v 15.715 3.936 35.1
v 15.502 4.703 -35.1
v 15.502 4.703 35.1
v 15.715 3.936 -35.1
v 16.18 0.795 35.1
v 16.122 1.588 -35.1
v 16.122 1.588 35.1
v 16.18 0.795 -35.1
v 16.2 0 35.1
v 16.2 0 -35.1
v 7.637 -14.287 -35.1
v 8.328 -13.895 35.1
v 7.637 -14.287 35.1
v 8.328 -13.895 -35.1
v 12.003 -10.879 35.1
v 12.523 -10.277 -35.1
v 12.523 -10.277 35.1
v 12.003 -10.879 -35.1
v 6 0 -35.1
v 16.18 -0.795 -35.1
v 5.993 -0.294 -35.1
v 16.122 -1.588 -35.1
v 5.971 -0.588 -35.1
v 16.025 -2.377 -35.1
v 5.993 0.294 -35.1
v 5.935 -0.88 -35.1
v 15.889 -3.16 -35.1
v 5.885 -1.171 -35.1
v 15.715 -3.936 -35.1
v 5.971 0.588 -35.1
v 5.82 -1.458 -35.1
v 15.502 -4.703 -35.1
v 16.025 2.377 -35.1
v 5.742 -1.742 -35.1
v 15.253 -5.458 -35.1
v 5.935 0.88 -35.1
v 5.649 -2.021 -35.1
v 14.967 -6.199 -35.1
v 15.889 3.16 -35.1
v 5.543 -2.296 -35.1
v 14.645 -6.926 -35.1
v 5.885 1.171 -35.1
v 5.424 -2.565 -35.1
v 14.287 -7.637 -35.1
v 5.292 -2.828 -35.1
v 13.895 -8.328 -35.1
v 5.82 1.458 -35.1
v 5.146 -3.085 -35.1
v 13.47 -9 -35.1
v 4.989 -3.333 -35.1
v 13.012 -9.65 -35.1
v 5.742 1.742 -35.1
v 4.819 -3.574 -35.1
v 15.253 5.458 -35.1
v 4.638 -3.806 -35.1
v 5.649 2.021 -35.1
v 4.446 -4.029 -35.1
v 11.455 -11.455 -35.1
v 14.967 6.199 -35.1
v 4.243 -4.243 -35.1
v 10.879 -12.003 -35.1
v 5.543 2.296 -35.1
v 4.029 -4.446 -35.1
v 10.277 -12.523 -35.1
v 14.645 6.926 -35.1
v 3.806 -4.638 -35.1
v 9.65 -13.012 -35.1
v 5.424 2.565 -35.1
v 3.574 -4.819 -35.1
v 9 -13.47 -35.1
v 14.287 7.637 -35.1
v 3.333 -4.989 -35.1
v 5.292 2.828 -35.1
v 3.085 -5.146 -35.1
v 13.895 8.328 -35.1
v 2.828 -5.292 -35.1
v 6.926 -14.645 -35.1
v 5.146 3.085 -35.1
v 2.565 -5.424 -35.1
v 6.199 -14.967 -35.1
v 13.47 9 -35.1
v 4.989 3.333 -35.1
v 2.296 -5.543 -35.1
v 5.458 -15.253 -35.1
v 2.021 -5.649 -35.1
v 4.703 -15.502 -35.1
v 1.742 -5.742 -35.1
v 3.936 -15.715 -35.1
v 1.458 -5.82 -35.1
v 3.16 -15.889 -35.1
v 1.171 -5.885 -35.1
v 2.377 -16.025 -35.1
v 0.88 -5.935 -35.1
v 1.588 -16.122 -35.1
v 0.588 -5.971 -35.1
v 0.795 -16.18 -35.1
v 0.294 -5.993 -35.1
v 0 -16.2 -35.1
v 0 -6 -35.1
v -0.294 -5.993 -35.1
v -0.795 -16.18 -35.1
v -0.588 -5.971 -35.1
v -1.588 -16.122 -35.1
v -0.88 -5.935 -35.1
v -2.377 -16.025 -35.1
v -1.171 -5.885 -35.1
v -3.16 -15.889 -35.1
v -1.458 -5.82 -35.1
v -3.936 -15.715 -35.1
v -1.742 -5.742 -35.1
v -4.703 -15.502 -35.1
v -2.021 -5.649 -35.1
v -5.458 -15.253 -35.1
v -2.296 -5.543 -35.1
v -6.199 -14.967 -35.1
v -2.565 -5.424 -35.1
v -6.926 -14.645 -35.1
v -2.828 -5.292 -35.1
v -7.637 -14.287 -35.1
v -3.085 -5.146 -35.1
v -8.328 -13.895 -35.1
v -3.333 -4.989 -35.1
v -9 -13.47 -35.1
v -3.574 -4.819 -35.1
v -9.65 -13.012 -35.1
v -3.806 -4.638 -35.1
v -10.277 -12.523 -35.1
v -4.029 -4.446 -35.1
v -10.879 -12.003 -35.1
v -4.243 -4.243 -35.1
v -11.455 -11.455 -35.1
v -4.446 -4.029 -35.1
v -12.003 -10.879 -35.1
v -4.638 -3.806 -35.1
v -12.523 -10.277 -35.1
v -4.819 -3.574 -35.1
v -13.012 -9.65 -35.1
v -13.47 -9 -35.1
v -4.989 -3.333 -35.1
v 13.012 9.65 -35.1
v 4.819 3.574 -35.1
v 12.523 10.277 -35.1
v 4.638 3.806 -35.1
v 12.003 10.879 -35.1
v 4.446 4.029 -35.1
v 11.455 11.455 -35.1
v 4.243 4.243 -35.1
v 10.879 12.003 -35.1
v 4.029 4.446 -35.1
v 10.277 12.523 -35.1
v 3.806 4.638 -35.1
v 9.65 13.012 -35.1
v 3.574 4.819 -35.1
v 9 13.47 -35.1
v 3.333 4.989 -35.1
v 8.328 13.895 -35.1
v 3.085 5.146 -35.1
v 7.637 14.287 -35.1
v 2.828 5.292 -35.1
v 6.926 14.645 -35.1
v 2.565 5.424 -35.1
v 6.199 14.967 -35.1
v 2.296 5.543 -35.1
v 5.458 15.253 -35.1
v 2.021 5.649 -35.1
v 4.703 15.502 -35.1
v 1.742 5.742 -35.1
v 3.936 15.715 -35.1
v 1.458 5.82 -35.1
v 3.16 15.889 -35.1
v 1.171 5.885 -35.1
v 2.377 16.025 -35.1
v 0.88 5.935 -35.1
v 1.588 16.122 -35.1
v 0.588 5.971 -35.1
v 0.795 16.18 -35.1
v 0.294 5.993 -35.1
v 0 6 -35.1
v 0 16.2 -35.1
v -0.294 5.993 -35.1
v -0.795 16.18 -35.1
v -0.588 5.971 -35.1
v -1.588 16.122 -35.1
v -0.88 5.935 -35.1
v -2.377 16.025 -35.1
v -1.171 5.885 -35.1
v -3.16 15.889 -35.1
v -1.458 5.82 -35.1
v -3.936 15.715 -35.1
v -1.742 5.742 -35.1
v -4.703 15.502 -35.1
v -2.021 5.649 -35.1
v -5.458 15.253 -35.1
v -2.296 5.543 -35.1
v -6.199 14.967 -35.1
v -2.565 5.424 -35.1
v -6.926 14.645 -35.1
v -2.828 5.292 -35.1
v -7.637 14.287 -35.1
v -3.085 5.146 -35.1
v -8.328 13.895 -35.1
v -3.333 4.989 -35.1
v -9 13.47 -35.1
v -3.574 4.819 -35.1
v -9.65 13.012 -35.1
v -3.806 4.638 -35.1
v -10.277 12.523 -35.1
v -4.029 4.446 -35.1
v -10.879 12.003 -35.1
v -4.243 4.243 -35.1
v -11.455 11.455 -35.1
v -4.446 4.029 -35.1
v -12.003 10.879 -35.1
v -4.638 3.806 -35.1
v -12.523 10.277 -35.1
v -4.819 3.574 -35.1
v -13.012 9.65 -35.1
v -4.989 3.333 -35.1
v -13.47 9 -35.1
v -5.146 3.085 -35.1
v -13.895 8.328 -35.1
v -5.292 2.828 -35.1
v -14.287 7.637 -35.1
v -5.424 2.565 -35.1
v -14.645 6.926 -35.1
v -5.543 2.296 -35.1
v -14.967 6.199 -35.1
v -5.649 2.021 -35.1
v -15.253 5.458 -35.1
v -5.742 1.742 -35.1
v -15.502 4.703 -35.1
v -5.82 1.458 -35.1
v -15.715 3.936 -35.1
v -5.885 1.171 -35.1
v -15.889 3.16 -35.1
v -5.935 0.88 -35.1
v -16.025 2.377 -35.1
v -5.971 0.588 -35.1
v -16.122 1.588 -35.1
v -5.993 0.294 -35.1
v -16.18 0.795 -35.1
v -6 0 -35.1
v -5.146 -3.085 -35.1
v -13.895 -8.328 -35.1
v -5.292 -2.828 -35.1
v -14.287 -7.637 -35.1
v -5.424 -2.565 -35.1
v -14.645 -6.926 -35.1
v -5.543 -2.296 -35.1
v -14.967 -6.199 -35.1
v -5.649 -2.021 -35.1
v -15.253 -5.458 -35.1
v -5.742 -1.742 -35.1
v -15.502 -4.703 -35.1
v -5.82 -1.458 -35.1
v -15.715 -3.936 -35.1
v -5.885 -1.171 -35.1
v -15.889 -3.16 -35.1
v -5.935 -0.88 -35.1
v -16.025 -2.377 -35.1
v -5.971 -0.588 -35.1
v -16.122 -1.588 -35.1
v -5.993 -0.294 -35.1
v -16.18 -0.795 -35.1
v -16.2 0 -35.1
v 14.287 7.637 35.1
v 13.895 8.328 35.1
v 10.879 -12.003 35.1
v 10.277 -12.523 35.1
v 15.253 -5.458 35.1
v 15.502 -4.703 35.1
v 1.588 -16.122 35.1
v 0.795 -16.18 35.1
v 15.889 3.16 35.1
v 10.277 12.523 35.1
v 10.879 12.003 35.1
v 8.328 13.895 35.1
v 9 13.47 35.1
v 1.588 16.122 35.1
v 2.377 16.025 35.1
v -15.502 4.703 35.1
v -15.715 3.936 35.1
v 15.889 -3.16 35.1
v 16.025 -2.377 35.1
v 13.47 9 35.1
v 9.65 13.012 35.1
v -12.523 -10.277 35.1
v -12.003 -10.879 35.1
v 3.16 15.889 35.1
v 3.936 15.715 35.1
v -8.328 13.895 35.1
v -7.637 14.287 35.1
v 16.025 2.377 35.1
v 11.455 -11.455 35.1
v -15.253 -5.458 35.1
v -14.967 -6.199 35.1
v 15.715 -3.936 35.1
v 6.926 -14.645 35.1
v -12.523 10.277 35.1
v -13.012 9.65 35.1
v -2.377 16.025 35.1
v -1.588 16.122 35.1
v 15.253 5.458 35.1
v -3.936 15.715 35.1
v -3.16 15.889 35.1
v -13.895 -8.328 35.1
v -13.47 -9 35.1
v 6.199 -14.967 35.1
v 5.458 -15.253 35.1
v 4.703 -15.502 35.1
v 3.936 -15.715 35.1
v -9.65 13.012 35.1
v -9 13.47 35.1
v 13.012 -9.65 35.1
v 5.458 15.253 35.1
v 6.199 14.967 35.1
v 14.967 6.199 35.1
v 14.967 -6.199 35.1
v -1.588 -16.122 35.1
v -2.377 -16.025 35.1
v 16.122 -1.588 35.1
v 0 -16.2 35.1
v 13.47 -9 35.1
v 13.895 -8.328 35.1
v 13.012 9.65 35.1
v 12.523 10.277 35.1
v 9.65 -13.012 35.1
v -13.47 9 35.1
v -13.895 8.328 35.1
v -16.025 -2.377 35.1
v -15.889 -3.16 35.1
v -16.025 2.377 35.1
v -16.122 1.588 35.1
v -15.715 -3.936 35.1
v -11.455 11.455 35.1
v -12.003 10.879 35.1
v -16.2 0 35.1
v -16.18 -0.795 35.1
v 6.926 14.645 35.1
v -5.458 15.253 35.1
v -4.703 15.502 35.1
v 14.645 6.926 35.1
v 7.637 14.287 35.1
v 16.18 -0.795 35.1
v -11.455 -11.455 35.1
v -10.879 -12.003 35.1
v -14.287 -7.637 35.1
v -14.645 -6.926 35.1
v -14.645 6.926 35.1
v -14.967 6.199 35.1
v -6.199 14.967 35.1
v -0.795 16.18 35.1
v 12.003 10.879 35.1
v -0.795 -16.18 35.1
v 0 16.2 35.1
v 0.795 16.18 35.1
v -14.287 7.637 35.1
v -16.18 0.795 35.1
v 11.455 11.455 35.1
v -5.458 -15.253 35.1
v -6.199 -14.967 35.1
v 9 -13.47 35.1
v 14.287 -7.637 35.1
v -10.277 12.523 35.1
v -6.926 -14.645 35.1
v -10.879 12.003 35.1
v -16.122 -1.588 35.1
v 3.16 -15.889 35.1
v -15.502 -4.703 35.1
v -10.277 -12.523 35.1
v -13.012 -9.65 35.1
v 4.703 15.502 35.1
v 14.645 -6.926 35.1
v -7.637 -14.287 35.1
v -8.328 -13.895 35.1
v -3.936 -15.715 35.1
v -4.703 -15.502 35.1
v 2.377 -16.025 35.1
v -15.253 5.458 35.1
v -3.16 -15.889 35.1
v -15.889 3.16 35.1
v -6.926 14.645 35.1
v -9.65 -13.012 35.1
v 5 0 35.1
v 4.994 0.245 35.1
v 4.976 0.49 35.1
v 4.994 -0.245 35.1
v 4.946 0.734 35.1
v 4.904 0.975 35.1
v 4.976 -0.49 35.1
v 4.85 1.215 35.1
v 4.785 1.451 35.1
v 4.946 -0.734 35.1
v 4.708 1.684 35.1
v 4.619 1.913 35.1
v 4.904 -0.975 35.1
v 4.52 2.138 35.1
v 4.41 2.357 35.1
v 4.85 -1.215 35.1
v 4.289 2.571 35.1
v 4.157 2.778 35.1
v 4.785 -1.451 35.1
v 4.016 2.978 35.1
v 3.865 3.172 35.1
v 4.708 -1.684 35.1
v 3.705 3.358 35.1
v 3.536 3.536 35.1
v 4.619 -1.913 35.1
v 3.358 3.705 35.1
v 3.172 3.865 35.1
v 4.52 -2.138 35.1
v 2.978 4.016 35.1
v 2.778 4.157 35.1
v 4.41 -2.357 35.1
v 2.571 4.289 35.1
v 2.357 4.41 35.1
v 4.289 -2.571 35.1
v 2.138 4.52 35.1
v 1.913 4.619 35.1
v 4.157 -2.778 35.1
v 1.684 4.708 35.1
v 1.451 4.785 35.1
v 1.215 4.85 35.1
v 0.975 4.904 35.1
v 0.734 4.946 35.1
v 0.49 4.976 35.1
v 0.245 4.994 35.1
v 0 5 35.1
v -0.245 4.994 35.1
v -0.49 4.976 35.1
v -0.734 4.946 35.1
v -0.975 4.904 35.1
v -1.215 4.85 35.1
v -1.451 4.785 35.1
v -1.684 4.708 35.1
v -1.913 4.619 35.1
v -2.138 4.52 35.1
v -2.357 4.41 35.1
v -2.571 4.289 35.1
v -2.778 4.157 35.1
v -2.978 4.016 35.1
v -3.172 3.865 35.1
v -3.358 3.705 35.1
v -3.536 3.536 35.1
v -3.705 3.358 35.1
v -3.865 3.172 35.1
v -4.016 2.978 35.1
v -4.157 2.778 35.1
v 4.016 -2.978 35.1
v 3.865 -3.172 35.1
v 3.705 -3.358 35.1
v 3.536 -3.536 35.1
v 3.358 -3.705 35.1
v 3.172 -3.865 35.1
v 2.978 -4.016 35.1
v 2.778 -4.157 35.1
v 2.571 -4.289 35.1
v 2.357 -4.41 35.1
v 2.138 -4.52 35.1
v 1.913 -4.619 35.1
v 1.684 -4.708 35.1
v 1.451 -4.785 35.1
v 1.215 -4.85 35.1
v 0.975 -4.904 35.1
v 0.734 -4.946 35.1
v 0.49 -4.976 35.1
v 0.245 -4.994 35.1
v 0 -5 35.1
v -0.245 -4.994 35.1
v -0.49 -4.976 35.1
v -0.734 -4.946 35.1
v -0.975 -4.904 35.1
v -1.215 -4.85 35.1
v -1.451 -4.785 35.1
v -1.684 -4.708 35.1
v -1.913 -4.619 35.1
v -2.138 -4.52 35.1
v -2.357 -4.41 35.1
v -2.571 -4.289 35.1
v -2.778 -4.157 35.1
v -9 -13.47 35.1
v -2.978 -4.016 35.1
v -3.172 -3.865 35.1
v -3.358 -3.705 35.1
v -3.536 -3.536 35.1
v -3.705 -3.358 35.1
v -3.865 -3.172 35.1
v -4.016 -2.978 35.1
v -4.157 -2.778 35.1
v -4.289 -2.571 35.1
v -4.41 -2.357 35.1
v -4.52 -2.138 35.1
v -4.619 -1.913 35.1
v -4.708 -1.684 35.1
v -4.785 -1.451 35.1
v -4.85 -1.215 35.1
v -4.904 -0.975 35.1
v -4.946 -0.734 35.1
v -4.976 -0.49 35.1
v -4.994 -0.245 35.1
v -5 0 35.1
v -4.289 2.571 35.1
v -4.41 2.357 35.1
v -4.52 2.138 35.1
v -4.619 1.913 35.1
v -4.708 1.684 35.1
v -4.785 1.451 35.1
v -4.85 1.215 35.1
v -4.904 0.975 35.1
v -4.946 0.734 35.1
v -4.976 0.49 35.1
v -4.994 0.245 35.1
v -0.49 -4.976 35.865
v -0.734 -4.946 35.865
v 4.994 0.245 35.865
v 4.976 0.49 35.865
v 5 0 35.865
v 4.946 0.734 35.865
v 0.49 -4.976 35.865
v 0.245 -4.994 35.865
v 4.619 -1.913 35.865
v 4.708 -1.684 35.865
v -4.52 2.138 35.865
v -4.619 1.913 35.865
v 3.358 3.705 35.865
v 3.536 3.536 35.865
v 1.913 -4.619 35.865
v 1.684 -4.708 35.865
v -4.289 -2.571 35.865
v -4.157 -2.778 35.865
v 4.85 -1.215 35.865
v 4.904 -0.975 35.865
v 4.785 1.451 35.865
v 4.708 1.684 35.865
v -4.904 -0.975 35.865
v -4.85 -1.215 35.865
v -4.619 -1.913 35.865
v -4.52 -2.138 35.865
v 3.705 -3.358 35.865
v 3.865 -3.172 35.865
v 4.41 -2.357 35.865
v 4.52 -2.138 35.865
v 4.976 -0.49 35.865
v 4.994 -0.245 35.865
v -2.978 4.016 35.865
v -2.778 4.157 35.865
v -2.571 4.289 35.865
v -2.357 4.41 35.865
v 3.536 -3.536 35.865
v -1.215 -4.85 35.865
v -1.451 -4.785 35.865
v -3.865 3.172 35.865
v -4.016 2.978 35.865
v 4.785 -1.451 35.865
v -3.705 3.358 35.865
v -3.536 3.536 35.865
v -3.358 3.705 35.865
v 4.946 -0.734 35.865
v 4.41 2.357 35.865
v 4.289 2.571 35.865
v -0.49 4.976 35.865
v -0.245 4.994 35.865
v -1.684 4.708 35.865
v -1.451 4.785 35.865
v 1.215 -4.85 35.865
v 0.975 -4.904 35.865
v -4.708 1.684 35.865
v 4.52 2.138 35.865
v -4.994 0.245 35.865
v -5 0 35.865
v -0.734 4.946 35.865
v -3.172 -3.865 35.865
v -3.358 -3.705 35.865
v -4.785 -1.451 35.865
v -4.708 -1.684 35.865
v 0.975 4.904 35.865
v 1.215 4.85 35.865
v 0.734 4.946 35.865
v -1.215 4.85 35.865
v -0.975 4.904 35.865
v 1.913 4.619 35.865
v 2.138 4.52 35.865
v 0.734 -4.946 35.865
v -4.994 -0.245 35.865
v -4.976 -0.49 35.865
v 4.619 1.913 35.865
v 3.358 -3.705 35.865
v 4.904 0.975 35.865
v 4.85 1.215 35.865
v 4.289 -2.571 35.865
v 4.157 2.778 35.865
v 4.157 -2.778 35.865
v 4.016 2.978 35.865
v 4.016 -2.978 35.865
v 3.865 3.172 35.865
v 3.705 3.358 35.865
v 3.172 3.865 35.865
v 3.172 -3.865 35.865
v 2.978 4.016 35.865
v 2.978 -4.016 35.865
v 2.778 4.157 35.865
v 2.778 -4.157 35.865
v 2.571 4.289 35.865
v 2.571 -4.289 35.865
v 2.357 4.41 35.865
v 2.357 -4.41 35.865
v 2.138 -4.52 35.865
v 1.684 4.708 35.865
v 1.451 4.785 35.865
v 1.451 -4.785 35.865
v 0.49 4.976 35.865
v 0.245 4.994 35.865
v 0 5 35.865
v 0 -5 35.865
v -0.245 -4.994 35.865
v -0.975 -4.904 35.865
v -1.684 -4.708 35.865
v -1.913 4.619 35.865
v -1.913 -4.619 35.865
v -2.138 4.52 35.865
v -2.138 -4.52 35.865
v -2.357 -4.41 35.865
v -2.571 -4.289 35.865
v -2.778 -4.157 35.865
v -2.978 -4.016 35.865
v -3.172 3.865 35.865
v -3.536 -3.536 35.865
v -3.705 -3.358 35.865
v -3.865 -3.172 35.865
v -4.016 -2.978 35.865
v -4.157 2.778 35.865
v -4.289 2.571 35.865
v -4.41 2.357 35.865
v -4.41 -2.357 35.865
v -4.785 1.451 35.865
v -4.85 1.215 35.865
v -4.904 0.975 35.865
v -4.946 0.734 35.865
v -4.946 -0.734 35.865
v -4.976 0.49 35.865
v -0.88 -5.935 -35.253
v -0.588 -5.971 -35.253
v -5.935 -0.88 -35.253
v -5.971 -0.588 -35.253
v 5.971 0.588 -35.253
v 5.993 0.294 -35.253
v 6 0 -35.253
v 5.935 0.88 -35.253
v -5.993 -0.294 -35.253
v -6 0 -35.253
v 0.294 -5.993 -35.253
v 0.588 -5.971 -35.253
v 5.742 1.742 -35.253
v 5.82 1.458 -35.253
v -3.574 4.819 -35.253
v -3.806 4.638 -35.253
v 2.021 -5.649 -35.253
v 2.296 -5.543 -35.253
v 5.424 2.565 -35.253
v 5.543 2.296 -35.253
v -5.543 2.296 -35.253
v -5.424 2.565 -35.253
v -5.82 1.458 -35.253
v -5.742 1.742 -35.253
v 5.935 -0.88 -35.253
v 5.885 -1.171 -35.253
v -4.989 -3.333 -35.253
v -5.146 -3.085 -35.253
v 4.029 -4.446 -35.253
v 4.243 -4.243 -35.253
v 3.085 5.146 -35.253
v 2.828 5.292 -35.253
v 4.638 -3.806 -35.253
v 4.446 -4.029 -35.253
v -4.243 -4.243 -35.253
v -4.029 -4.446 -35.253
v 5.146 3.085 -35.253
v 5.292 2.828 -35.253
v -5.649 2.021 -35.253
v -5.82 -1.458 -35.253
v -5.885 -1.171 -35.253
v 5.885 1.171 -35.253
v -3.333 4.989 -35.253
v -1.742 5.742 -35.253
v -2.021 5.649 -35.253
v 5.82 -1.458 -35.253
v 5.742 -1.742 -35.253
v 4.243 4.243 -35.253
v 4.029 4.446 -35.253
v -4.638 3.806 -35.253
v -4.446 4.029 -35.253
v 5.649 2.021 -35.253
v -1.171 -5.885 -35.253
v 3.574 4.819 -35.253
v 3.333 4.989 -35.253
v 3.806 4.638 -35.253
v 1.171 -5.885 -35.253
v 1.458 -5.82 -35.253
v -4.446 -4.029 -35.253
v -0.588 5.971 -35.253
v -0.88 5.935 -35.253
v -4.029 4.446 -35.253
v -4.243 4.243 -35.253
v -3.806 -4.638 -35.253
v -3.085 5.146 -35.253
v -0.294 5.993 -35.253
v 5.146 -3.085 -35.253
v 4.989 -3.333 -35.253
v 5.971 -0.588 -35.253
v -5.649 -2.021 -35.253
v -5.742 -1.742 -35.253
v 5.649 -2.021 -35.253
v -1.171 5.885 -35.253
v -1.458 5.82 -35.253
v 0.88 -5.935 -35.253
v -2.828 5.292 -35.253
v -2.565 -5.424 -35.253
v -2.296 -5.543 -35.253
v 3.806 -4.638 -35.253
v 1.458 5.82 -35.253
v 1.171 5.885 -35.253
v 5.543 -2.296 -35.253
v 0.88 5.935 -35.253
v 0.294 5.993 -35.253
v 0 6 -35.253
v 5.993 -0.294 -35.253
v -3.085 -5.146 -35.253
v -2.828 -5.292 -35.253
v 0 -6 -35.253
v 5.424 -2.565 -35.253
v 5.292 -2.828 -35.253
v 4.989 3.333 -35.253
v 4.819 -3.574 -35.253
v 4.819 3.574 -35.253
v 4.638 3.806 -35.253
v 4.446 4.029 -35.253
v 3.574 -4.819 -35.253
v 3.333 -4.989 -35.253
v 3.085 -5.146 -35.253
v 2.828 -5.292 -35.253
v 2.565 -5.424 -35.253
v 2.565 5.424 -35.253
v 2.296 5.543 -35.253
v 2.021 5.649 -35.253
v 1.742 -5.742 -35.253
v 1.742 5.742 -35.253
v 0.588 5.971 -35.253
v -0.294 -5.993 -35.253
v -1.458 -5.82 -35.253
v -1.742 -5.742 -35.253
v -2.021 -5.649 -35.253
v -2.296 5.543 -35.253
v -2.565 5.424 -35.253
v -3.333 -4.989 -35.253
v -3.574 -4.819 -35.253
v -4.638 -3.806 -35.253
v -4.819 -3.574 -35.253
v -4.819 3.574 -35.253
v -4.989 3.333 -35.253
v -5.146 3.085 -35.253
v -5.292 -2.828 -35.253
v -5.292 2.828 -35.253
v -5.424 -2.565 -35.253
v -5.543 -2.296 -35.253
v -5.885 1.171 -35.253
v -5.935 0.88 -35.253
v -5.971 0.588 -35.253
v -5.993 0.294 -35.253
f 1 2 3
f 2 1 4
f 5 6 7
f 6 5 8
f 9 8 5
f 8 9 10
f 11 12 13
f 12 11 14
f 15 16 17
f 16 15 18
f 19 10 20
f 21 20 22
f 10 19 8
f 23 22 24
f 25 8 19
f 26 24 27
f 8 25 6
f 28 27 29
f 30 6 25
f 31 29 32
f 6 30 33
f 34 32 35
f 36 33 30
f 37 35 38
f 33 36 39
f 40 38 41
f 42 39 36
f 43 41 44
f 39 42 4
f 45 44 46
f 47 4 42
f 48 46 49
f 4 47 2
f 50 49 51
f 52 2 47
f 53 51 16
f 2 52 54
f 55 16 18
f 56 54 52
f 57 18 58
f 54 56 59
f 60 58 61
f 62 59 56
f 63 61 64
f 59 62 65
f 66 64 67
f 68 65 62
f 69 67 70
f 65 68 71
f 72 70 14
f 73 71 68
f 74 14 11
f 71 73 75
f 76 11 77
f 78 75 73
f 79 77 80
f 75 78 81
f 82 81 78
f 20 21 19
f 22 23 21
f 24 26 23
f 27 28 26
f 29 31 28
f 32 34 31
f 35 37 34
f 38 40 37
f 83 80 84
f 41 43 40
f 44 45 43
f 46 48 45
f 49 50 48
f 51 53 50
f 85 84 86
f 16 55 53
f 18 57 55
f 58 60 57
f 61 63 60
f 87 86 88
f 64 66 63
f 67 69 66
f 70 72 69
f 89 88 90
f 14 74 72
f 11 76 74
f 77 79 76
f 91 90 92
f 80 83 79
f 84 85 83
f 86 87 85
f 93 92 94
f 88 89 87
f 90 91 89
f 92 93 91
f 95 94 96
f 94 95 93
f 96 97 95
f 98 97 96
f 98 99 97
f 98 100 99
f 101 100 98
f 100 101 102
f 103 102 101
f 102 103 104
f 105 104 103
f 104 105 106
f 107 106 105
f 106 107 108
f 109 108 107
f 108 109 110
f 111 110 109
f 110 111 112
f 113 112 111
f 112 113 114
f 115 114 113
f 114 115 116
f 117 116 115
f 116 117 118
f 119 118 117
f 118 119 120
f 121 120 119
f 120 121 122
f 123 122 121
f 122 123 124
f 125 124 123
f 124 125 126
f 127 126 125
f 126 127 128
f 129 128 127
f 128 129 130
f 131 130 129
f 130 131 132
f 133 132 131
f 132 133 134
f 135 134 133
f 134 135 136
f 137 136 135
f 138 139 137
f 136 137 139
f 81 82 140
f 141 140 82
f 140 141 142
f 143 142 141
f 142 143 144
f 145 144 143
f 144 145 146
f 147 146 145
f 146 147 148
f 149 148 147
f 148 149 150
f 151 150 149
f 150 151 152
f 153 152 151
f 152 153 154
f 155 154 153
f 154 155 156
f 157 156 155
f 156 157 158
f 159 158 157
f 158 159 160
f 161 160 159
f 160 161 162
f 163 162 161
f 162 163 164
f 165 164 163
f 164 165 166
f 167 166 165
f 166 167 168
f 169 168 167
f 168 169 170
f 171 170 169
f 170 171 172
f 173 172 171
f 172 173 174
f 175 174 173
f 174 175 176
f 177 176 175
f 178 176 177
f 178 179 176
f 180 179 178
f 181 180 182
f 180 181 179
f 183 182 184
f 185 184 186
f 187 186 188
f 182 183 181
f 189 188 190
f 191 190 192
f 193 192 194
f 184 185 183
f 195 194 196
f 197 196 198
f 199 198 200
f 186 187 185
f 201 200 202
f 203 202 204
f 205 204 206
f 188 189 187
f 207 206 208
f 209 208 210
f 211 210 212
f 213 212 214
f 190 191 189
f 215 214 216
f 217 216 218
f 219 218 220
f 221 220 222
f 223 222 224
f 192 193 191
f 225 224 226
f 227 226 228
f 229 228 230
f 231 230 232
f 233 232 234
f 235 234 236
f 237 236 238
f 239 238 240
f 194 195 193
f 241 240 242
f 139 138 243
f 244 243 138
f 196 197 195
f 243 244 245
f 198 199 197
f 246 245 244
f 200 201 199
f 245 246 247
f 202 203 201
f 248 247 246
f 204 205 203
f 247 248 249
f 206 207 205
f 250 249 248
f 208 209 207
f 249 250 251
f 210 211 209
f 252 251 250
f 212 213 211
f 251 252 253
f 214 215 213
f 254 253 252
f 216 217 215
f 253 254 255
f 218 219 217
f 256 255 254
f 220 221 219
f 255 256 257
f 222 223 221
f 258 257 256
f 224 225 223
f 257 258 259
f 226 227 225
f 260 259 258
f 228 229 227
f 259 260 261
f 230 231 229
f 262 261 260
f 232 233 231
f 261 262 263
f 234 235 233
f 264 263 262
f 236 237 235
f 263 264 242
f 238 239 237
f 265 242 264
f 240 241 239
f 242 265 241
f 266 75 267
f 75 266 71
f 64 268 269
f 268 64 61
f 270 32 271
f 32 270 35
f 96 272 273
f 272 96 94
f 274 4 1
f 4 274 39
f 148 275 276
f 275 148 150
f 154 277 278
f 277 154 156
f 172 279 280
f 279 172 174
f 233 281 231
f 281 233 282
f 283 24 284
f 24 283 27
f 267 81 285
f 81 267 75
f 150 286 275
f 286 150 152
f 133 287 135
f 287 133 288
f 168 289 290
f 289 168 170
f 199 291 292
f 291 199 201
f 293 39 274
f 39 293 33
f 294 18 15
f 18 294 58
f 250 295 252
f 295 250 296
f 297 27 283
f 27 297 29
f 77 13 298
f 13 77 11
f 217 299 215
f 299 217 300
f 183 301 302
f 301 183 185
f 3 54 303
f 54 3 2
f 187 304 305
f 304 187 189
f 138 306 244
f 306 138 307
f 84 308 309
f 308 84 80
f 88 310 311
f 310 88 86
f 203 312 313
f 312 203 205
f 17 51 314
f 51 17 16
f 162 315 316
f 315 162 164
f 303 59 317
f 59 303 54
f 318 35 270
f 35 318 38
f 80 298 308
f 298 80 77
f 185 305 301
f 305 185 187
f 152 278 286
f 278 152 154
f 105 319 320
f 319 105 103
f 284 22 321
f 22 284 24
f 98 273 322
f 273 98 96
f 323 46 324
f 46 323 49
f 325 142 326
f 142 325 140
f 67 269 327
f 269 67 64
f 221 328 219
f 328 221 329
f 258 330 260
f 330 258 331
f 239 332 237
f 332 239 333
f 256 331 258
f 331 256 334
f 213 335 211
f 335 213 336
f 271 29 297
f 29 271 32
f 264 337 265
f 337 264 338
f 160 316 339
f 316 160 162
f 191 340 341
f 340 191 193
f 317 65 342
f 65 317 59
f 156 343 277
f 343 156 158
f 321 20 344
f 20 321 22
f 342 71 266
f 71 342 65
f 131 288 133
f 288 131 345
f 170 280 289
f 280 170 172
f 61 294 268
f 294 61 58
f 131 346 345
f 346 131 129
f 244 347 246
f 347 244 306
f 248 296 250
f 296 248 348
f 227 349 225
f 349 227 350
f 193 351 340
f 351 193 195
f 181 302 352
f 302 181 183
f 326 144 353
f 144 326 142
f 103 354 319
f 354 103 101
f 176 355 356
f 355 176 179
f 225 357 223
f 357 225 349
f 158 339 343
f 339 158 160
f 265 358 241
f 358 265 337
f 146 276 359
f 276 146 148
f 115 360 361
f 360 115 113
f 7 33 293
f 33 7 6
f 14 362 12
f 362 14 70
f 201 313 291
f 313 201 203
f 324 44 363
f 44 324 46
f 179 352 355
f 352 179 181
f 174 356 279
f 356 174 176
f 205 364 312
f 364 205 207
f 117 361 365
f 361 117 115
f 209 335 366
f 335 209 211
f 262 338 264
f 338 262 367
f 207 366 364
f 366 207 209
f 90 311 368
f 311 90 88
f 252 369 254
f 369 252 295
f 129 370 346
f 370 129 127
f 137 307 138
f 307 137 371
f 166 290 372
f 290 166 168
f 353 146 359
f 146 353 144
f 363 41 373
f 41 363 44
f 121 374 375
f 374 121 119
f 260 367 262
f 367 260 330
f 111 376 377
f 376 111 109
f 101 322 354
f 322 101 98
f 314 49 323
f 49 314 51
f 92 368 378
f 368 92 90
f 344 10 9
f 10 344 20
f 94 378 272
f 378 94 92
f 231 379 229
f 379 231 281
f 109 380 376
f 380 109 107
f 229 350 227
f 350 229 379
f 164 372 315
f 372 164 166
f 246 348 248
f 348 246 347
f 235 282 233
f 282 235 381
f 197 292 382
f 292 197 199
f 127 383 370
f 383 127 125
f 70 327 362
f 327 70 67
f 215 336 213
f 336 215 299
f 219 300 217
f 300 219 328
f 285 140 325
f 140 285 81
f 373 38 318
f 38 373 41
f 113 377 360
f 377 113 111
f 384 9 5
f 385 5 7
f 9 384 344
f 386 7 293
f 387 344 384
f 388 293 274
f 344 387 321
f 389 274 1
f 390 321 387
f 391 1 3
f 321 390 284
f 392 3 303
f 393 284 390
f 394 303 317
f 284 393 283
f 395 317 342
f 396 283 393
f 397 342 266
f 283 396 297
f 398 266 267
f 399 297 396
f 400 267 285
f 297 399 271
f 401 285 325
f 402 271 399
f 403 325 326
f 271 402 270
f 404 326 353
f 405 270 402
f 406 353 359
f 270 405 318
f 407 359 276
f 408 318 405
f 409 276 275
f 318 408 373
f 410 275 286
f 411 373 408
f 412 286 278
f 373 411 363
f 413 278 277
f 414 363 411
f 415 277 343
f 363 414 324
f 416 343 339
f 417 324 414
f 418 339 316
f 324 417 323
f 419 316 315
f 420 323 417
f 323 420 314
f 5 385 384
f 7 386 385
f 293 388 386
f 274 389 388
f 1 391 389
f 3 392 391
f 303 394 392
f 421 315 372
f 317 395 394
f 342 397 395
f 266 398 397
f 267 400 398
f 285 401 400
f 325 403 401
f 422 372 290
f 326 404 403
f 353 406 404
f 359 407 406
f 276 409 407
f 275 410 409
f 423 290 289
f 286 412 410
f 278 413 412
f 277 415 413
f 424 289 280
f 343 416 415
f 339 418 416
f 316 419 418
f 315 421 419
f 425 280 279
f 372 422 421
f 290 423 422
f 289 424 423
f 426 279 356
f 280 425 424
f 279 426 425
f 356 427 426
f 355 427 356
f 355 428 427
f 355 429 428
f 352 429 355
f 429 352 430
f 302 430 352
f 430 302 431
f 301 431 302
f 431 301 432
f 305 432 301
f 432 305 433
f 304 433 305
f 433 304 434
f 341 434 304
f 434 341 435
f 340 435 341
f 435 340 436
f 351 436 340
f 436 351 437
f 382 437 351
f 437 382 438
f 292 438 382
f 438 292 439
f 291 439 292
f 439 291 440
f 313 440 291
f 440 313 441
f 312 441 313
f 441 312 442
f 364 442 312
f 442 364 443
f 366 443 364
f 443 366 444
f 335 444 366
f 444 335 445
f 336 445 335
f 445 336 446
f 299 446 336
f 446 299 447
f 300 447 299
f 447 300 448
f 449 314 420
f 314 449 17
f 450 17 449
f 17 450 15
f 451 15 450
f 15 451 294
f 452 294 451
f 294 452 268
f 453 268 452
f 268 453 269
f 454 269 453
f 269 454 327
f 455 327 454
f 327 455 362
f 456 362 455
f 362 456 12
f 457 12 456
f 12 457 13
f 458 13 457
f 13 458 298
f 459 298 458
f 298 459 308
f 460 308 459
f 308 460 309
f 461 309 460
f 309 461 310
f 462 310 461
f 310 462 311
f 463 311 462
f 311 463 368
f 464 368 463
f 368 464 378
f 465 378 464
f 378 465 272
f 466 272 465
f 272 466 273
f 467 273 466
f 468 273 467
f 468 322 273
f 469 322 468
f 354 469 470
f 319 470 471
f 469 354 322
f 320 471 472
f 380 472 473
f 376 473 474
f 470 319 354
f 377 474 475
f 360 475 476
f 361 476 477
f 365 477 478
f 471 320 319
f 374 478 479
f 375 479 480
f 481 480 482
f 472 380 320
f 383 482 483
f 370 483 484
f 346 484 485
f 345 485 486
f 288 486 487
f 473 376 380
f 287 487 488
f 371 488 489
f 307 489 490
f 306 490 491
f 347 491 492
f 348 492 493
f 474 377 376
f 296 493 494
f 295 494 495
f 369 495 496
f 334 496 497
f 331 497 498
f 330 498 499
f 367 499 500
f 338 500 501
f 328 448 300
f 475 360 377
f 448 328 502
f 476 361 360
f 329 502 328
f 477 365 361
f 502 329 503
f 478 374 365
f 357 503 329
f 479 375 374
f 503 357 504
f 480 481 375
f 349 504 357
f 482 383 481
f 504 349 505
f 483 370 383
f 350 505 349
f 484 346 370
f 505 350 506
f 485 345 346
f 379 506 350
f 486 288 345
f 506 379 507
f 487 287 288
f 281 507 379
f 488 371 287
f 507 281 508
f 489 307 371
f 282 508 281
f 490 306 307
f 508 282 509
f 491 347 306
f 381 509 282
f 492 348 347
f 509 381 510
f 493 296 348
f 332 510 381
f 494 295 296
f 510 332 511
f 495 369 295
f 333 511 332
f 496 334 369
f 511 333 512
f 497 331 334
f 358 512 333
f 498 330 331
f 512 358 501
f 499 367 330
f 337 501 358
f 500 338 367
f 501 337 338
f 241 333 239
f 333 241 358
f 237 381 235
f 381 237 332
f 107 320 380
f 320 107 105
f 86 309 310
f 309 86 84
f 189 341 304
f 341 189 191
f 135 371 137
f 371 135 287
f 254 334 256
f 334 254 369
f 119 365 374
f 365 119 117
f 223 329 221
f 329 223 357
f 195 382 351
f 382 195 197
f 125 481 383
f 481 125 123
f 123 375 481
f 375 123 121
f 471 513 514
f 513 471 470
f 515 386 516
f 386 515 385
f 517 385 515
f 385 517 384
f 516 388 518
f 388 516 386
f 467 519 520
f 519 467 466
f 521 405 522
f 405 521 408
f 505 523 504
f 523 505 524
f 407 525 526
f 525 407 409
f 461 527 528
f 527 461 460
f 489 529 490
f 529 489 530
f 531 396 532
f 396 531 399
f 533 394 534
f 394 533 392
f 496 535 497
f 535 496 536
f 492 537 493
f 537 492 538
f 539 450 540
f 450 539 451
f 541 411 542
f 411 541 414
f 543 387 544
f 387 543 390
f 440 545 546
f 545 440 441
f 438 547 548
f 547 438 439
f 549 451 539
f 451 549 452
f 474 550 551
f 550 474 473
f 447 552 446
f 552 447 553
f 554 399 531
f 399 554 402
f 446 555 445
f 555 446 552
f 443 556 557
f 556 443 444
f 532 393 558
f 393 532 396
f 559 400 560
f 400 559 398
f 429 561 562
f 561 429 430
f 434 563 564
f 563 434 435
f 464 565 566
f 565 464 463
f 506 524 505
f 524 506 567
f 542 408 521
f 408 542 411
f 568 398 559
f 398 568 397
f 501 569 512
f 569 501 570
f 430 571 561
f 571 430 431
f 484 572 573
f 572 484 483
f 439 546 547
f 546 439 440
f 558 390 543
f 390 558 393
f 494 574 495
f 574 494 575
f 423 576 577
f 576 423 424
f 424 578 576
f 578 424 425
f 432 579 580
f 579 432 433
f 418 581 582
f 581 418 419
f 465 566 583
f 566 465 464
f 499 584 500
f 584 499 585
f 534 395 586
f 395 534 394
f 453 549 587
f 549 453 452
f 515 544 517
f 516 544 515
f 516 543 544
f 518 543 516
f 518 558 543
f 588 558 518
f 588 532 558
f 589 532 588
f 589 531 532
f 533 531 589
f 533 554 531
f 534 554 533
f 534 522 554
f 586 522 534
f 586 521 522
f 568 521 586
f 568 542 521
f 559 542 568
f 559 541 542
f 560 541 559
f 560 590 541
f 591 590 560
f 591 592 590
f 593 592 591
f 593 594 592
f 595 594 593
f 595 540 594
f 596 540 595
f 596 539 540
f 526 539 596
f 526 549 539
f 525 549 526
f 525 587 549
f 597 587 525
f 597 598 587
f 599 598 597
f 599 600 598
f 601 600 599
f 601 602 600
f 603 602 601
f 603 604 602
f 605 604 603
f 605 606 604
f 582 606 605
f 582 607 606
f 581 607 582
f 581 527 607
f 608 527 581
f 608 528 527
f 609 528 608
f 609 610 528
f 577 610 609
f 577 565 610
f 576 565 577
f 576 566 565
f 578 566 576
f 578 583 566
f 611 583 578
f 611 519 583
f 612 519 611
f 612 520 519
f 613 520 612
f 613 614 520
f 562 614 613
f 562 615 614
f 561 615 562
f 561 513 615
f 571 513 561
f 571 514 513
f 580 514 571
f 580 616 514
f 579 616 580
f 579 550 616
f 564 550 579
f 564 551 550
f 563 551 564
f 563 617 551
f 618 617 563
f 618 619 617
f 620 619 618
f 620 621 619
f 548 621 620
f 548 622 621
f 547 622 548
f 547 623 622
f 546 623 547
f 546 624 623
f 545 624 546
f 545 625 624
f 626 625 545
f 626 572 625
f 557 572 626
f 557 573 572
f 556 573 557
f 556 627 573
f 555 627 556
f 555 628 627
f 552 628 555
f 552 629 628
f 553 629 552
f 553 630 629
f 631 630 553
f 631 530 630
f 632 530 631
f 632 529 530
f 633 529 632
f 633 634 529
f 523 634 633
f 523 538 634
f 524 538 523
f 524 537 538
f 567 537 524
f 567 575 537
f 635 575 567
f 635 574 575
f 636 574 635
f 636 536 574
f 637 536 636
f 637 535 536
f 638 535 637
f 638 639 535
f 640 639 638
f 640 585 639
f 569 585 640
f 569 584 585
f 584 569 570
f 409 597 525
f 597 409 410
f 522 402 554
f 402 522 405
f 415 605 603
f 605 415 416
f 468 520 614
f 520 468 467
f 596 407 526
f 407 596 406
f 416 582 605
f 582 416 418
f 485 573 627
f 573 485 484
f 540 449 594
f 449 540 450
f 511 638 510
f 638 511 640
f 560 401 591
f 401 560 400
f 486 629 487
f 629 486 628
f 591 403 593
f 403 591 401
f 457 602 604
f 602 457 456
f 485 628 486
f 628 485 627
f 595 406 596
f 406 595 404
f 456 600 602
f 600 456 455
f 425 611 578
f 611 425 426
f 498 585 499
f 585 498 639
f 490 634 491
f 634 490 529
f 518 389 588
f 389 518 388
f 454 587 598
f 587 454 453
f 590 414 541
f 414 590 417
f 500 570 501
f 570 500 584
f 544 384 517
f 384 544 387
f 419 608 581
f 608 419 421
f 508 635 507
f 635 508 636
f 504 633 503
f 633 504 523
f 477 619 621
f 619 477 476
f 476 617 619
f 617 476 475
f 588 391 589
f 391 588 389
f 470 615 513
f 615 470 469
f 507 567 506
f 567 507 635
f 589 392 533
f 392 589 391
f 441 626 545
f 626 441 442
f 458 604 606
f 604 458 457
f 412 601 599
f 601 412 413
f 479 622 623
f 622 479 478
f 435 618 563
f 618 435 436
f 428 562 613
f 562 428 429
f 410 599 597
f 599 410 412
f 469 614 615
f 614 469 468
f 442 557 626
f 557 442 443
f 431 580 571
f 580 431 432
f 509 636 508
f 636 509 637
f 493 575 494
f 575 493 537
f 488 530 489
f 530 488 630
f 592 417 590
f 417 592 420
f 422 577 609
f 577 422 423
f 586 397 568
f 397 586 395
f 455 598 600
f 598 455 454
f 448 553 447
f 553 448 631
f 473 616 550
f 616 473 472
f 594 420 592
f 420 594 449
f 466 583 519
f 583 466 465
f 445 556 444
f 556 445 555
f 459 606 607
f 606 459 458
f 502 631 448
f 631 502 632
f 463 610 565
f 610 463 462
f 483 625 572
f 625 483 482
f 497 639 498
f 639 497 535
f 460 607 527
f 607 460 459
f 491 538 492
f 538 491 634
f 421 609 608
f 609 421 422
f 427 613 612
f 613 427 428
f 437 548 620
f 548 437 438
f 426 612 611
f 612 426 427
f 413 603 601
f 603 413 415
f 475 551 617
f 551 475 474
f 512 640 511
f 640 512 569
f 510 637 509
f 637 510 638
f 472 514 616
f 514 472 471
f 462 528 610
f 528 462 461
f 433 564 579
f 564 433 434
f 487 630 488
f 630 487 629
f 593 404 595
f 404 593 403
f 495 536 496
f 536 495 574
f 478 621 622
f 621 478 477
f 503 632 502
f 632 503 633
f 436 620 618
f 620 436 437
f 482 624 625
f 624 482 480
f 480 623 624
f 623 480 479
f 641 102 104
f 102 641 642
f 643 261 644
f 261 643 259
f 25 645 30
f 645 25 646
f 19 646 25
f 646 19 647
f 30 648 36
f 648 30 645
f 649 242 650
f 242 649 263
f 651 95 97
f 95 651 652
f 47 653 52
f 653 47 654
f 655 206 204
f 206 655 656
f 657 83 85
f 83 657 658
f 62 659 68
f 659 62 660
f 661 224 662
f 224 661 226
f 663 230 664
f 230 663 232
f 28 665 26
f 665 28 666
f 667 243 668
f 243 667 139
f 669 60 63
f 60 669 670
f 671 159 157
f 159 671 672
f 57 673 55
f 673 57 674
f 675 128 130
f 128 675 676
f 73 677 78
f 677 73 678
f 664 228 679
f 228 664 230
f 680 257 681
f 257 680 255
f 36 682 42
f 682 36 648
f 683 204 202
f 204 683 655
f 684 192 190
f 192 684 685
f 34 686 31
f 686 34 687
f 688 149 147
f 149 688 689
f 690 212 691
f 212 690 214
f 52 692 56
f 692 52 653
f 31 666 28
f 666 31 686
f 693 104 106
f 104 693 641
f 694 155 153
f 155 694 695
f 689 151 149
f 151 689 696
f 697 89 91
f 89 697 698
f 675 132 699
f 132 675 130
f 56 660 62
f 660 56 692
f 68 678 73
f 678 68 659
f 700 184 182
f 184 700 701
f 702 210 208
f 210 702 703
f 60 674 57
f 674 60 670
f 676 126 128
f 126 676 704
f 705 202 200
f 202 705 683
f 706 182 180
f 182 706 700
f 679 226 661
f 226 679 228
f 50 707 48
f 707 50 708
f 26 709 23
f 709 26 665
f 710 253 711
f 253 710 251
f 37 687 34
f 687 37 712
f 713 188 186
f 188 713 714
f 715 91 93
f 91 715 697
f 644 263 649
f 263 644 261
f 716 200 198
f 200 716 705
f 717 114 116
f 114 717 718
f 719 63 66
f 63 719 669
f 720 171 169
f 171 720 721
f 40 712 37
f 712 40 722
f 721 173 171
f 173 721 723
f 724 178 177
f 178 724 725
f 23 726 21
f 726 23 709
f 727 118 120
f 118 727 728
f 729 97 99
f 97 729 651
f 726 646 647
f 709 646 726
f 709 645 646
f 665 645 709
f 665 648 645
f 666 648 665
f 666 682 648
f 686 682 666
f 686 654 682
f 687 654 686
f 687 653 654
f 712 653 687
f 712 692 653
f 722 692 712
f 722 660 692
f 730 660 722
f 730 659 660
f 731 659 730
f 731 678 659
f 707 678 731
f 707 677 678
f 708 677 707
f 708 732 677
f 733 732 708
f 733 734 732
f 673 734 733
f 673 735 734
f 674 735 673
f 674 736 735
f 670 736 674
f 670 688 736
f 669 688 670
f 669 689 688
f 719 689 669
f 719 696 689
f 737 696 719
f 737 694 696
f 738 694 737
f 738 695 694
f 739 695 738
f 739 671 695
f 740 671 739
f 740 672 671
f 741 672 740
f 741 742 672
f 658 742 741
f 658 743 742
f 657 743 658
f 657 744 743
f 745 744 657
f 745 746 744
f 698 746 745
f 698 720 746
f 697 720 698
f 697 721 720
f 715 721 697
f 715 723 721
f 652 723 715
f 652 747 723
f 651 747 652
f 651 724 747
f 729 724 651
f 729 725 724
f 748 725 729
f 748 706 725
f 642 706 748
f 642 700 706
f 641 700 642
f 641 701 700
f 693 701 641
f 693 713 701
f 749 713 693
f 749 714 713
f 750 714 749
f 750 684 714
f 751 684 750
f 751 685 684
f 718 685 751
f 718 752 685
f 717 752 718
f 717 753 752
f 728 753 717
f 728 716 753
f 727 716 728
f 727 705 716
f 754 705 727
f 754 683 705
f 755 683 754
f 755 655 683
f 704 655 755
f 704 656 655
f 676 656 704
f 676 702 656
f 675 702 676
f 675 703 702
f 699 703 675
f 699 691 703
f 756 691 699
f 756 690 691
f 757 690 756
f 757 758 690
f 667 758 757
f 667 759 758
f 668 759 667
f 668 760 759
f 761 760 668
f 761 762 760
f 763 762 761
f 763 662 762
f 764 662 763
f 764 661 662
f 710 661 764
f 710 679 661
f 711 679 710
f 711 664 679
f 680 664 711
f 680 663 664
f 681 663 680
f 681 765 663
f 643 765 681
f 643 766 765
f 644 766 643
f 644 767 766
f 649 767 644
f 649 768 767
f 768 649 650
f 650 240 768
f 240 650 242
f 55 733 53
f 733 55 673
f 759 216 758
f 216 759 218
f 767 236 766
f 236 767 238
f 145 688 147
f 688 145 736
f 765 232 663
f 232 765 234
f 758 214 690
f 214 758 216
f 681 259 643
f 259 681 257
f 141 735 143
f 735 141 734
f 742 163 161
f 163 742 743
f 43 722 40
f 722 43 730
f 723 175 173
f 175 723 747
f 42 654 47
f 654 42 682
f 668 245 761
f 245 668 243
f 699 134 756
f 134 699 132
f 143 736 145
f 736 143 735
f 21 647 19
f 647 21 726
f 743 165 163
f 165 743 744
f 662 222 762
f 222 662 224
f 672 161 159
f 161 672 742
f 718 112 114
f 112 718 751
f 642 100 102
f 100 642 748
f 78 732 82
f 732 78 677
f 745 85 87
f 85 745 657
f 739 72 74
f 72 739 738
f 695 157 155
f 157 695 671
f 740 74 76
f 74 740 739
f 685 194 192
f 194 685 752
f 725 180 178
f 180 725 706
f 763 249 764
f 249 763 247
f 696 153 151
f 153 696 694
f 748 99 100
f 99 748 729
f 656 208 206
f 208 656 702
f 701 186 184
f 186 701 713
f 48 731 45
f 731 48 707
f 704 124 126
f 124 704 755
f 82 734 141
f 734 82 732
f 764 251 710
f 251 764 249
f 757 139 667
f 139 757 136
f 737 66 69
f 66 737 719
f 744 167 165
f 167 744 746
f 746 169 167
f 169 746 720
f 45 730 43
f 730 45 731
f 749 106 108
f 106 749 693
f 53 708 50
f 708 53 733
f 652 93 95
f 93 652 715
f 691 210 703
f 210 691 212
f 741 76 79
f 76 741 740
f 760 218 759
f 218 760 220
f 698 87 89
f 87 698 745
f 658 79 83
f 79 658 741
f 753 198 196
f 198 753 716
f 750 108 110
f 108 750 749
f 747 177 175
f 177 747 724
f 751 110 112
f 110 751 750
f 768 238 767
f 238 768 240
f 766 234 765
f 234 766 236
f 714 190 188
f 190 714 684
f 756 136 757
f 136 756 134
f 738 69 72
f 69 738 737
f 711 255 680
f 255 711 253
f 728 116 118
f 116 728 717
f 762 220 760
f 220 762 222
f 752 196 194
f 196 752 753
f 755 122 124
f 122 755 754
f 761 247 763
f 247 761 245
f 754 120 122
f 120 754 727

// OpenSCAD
// Battery cell: 70.2mm tall, 32.4mm diameter
// One connected solid, no floating parts

height_mm   = 70.2;   //[35.1:140.4:0.1]
diameter_mm = 32.4;   //[16.2:64.8:0.1]

positive_terminal_diameter_mm = 10;   //[5:20:0.1]
positive_terminal_height_mm   = 1.5;  //[0.75:3:0.05]
negative_terminal_diameter_mm = 12;   //[6:24:0.1]
negative_terminal_height_mm   = 0.3;  //[0.15:0.6:0.01]

connect_overlap_mm = 0.8; //[0.5:2:0.1]
$fn = 128;

module battery_cell(h=height_mm, d=diameter_mm) {
    r = d/2;

    // Clamp overlap so it always creates a small intersection without inverting thin terminals
    ov_pos = min(connect_overlap_mm, positive_terminal_height_mm * 0.49);
    ov_neg = min(connect_overlap_mm, negative_terminal_height_mm * 0.49);

    union() {
        // Main body (centered)
        cylinder(h=h, r=r, center=true);

        // Positive terminal (top) - connected via calculated placement + overlap
        translate([0, 0, h/2 + positive_terminal_height_mm/2 - ov_pos])
            cylinder(h=positive_terminal_height_mm, r=positive_terminal_diameter_mm/2, center=true);

        // Negative terminal (bottom) - connected via calculated placement + overlap
        translate([0, 0, -h/2 - negative_terminal_height_mm/2 + ov_neg])
            cylinder(h=negative_terminal_height_mm, r=negative_terminal_diameter_mm/2, center=true);
    }
}

battery_cell();
